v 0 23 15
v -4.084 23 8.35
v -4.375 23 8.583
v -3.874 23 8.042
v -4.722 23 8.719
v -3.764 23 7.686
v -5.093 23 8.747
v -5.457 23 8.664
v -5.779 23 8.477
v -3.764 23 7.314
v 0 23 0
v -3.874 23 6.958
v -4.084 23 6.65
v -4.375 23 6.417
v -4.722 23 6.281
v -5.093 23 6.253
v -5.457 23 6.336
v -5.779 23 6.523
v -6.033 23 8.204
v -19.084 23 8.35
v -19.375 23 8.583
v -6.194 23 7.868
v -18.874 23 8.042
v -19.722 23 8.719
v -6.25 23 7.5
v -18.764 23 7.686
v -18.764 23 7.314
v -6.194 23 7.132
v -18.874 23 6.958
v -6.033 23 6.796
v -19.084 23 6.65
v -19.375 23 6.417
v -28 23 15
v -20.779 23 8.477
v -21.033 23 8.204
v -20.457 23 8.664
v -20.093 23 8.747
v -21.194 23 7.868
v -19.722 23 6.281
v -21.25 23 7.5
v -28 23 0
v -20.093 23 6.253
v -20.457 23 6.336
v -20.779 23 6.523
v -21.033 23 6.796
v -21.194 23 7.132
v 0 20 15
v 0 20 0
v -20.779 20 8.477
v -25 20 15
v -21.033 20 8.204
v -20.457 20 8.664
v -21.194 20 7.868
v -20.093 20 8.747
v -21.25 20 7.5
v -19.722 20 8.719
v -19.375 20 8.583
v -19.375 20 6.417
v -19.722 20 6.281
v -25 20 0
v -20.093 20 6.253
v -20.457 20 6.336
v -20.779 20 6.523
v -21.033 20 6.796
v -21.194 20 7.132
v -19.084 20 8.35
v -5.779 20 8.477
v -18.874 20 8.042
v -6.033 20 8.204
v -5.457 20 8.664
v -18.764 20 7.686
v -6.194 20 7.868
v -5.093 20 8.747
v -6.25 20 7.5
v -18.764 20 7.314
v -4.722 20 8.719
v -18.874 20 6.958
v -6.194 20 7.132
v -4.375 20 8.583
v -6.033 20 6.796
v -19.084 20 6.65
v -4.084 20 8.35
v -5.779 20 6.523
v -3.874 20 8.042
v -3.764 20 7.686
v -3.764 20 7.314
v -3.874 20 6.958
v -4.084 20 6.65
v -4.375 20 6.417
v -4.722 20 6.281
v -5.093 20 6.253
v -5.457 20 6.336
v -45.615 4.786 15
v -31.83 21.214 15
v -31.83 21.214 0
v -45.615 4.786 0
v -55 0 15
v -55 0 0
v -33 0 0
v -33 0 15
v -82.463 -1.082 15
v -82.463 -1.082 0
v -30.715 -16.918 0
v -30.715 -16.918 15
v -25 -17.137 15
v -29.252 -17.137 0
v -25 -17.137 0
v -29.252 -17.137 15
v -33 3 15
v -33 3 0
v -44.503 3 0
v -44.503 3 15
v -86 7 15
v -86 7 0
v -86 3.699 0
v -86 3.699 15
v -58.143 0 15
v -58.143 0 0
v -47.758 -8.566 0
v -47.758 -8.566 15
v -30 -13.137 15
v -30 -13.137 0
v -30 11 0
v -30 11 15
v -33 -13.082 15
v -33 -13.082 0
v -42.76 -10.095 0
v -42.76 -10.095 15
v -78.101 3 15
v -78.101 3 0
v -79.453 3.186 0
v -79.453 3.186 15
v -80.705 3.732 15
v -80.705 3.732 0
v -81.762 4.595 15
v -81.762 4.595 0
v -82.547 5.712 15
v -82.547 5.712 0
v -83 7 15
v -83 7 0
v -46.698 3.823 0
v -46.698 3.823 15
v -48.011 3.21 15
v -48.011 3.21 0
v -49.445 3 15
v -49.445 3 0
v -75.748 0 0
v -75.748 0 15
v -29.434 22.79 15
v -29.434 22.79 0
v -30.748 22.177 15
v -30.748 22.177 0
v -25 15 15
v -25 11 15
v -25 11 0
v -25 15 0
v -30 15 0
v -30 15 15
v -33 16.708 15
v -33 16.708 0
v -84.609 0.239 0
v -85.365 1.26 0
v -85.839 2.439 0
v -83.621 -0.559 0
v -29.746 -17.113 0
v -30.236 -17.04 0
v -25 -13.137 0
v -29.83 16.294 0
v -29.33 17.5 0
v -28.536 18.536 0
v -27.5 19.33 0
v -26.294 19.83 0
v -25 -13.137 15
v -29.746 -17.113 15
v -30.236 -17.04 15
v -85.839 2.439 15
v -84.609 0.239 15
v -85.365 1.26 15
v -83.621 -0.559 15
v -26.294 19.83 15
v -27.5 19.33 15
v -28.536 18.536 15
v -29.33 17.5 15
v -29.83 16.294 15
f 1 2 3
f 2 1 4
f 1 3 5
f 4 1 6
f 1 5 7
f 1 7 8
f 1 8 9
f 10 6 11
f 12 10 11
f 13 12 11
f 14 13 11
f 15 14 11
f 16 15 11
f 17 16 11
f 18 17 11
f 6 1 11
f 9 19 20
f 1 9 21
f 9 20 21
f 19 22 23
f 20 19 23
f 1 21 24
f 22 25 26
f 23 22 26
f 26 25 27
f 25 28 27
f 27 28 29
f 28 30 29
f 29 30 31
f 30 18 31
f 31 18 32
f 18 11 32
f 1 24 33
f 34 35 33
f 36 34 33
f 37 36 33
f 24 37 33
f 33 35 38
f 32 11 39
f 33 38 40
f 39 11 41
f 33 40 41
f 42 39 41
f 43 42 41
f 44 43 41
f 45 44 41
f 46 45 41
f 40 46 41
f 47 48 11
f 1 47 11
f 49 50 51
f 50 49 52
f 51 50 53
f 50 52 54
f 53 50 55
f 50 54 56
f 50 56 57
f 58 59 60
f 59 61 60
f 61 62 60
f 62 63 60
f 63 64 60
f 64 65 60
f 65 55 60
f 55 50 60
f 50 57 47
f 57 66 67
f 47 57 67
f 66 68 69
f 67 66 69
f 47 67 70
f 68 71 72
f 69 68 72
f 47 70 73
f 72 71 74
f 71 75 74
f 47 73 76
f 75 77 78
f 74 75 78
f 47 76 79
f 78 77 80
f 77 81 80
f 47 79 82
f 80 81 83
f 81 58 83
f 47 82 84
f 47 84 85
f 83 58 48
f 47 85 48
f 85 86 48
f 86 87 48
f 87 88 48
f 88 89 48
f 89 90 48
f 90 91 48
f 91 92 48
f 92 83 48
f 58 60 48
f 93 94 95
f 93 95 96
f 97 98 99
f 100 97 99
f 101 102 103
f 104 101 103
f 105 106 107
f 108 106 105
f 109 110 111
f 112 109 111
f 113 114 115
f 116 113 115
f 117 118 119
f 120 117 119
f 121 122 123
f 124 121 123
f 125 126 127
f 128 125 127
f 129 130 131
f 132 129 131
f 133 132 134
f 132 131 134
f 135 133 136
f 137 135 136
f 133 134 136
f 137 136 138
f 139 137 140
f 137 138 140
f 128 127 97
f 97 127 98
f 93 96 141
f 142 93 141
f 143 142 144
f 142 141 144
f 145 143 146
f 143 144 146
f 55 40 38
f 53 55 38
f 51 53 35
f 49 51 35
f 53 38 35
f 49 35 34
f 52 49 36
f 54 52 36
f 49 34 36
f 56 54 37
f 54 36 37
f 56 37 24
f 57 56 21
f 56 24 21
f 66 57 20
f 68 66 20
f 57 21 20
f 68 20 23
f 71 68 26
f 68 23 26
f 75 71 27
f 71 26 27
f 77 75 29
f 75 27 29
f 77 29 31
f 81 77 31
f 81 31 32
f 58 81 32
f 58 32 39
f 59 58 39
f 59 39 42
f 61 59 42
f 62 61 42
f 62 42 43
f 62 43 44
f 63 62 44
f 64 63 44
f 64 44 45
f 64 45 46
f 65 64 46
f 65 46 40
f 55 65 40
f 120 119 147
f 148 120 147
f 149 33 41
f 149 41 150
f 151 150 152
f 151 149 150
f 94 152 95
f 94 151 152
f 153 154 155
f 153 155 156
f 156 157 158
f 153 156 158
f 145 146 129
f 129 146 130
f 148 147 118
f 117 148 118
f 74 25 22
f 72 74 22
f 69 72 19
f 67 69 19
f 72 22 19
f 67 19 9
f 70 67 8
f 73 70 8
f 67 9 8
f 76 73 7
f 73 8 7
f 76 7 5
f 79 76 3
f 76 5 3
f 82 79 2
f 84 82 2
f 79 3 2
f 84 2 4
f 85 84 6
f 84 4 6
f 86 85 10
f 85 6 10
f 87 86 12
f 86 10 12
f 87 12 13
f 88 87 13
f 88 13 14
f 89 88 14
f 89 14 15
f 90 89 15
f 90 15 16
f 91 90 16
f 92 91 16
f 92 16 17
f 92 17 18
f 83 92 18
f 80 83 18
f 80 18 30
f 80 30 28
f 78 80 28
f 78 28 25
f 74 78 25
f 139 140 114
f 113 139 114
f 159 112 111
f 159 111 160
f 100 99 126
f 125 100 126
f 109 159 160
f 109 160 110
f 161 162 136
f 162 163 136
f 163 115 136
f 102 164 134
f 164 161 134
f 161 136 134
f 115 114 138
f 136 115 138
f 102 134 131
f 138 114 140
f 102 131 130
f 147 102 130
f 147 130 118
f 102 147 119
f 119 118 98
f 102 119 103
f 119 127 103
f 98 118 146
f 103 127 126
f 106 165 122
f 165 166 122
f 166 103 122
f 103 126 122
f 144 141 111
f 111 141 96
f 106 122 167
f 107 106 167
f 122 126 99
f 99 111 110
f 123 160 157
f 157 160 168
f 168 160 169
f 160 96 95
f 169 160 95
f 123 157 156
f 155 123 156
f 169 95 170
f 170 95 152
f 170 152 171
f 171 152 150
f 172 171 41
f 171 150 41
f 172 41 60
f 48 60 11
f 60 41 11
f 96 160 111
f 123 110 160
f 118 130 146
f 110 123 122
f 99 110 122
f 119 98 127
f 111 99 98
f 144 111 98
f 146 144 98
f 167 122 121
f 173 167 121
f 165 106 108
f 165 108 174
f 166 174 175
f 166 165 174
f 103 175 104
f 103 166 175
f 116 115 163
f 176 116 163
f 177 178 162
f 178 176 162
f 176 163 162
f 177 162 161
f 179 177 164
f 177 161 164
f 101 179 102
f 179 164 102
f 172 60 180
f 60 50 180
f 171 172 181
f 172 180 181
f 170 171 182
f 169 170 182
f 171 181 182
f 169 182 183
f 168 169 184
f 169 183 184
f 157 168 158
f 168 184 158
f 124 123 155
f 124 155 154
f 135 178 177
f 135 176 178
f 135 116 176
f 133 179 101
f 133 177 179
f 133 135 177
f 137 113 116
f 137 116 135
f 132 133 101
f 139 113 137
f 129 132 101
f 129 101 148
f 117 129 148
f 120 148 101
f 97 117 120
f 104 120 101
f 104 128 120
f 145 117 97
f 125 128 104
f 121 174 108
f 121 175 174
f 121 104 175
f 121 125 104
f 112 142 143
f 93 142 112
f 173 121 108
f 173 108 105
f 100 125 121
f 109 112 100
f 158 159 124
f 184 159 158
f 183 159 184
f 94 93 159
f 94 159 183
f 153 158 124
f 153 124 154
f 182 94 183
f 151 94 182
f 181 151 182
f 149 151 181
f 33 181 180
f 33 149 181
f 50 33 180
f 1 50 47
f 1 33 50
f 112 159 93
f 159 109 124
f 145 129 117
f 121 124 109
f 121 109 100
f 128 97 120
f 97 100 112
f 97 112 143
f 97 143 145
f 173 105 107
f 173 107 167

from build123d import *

# Parameters (mm, degrees)
F1_DEPTH    = 15
F2_R        = 1.25
F3_DEPTH    = 40.1383324758
F4_R        = 5
F5_W        = 4
F5_H        = 15
F6_DEPTH    = 5
F8_DEPTH    = 15
F9_T1_DEPTH = 15
F9_T3_DEPTH = 15
F9_T5_DEPTH = 33.4938424429
F9_T7_DEPTH = 18.7397003757


# Not quite as in the source:
# - a fillet or chamfer that OpenCascade refuses, or shapes differently, is made with other operations: its cross-section is extruded or revolved along the edge and cut away or added


with BuildPart() as f1:
    # F0 (on Top) → F1 (new body)
    with BuildSketch(Plane.XY):
        Polygon((0, 20), (0, 23), (-33, 23), (-33, 3), (-83, 3), (-83, 7), (-86, 7), (-86, 0), (-30, -17.1373324758), (-30, -14), (-30, 0), (-30, 20), align=None)
        Polygon((-47.7579661467, -8.5656398223), (-75.7480766687, 0), (-58.1432454597, 0), align=None, mode=Mode.SUBTRACT)
        Polygon((-33, 0), (-33, -13.0819286174), (-42.760486377, -10.0949875429), (-55, 0), align=None, mode=Mode.SUBTRACT)
    extrude(amount=F1_DEPTH)

    # F2 (on face) → F3 (cut, through all)
    with BuildSketch(Plane(origin=(0, 23, 0), x_dir=(-1, 0, 0), z_dir=(0, 1, 0))):
        with Locations((5, 7.5)):
            Circle(F2_R)
        with Locations((20, 7.5)):
            Circle(F2_R)
    extrude(amount=-F3_DEPTH, mode=Mode.SUBTRACT)

    # F4
    f4_edges = [f1.edges().sort_by_distance(p)[0] for p in [
        (-33, 23, 7.5),
        (-30, 20, 7.5),
    ]]
    fillet(f4_edges, radius=F4_R)

    # F5 (on face) → F6 (join)
    with BuildSketch(Plane.YZ.offset(-30)):
        with Locations((-15.1373324758, 7.5)):
            Rectangle(F5_W, F5_H)
        with Locations((13, 7.5)):
            Rectangle(F5_W, F5_H)
    extrude(amount=F6_DEPTH)

    # F7 (on face) → F8 (join, through all)
    with BuildSketch(Plane.XY.offset(15)):
        with BuildLine():
            Line((-31.8302222156, 21.2139380484), (-47.1135309143, 3))
            Line((-47.1135309143, 3), (-44.5027163357, 3))
            Line((-44.5027163357, 3), (-33, 16.7084035176))
            Line((-33, 16.7084035176), (-33, 18))
            ThreePointArc((-33, 18), (-32.6984631039, 19.7101007166), (-31.8302222156, 21.2139380484))
        make_face()
    extrude(amount=-F8_DEPTH)

    # F9: fillet of radius 5 on 4 edges, made by hand

    # F9_s2 → F9_t1 (join)
    with BuildSketch(Plane.XY):
        with BuildLine():
            ThreePointArc((-78.1010205144, 3), (-81.2632981746, 4.1270166538), (-83, 7))
            Line((-83, 7), (-83, 3))
            Line((-83, 3), (-78.1010205144, 3))
        make_face()
    extrude(amount=F9_T1_DEPTH)

    # F9_s4 → F9_t3 (join)
    with BuildSketch(Plane.XY):
        with BuildLine():
            ThreePointArc((-45.6148469895, 4.7860619516), (-47.3319778964, 3.4684610648), (-49.4450692051, 3))
            Line((-49.4450692051, 3), (-47.1135309143, 3))
            Line((-47.1135309143, 3), (-45.6148469895, 4.7860619516))
        make_face()
    extrude(amount=F9_T3_DEPTH)

    # F9_s6 → F9_t5 (cut)
    with BuildSketch(Plane.XY.offset(-9.2469212215)):
        with BuildLine():
            ThreePointArc((-86, 3.6987684886), (-85.0196828505, 0.7251932363), (-82.4631400875, -1.08236329))
            Line((-82.4631400875, -1.08236329), (-86, 0))
            Line((-86, 0), (-86, 3.6987684886))
        make_face()
    extrude(amount=F9_T5_DEPTH, mode=Mode.SUBTRACT)

    # F9_s8 → F9_t7 (cut)
    with BuildSketch(Plane.XY.offset(-1.8698501879)):
        with BuildLine():
            ThreePointArc((-29.2520599249, -17.1373324758), (-29.9917697014, -17.0823127029), (-30.7152000124, -16.9184642544))
            Line((-30.7152000124, -16.9184642544), (-30, -17.1373324758))
            Line((-30, -17.1373324758), (-29.2520599249, -17.1373324758))
        make_face()
    extrude(amount=F9_T7_DEPTH, mode=Mode.SUBTRACT)


solid = f1.part
